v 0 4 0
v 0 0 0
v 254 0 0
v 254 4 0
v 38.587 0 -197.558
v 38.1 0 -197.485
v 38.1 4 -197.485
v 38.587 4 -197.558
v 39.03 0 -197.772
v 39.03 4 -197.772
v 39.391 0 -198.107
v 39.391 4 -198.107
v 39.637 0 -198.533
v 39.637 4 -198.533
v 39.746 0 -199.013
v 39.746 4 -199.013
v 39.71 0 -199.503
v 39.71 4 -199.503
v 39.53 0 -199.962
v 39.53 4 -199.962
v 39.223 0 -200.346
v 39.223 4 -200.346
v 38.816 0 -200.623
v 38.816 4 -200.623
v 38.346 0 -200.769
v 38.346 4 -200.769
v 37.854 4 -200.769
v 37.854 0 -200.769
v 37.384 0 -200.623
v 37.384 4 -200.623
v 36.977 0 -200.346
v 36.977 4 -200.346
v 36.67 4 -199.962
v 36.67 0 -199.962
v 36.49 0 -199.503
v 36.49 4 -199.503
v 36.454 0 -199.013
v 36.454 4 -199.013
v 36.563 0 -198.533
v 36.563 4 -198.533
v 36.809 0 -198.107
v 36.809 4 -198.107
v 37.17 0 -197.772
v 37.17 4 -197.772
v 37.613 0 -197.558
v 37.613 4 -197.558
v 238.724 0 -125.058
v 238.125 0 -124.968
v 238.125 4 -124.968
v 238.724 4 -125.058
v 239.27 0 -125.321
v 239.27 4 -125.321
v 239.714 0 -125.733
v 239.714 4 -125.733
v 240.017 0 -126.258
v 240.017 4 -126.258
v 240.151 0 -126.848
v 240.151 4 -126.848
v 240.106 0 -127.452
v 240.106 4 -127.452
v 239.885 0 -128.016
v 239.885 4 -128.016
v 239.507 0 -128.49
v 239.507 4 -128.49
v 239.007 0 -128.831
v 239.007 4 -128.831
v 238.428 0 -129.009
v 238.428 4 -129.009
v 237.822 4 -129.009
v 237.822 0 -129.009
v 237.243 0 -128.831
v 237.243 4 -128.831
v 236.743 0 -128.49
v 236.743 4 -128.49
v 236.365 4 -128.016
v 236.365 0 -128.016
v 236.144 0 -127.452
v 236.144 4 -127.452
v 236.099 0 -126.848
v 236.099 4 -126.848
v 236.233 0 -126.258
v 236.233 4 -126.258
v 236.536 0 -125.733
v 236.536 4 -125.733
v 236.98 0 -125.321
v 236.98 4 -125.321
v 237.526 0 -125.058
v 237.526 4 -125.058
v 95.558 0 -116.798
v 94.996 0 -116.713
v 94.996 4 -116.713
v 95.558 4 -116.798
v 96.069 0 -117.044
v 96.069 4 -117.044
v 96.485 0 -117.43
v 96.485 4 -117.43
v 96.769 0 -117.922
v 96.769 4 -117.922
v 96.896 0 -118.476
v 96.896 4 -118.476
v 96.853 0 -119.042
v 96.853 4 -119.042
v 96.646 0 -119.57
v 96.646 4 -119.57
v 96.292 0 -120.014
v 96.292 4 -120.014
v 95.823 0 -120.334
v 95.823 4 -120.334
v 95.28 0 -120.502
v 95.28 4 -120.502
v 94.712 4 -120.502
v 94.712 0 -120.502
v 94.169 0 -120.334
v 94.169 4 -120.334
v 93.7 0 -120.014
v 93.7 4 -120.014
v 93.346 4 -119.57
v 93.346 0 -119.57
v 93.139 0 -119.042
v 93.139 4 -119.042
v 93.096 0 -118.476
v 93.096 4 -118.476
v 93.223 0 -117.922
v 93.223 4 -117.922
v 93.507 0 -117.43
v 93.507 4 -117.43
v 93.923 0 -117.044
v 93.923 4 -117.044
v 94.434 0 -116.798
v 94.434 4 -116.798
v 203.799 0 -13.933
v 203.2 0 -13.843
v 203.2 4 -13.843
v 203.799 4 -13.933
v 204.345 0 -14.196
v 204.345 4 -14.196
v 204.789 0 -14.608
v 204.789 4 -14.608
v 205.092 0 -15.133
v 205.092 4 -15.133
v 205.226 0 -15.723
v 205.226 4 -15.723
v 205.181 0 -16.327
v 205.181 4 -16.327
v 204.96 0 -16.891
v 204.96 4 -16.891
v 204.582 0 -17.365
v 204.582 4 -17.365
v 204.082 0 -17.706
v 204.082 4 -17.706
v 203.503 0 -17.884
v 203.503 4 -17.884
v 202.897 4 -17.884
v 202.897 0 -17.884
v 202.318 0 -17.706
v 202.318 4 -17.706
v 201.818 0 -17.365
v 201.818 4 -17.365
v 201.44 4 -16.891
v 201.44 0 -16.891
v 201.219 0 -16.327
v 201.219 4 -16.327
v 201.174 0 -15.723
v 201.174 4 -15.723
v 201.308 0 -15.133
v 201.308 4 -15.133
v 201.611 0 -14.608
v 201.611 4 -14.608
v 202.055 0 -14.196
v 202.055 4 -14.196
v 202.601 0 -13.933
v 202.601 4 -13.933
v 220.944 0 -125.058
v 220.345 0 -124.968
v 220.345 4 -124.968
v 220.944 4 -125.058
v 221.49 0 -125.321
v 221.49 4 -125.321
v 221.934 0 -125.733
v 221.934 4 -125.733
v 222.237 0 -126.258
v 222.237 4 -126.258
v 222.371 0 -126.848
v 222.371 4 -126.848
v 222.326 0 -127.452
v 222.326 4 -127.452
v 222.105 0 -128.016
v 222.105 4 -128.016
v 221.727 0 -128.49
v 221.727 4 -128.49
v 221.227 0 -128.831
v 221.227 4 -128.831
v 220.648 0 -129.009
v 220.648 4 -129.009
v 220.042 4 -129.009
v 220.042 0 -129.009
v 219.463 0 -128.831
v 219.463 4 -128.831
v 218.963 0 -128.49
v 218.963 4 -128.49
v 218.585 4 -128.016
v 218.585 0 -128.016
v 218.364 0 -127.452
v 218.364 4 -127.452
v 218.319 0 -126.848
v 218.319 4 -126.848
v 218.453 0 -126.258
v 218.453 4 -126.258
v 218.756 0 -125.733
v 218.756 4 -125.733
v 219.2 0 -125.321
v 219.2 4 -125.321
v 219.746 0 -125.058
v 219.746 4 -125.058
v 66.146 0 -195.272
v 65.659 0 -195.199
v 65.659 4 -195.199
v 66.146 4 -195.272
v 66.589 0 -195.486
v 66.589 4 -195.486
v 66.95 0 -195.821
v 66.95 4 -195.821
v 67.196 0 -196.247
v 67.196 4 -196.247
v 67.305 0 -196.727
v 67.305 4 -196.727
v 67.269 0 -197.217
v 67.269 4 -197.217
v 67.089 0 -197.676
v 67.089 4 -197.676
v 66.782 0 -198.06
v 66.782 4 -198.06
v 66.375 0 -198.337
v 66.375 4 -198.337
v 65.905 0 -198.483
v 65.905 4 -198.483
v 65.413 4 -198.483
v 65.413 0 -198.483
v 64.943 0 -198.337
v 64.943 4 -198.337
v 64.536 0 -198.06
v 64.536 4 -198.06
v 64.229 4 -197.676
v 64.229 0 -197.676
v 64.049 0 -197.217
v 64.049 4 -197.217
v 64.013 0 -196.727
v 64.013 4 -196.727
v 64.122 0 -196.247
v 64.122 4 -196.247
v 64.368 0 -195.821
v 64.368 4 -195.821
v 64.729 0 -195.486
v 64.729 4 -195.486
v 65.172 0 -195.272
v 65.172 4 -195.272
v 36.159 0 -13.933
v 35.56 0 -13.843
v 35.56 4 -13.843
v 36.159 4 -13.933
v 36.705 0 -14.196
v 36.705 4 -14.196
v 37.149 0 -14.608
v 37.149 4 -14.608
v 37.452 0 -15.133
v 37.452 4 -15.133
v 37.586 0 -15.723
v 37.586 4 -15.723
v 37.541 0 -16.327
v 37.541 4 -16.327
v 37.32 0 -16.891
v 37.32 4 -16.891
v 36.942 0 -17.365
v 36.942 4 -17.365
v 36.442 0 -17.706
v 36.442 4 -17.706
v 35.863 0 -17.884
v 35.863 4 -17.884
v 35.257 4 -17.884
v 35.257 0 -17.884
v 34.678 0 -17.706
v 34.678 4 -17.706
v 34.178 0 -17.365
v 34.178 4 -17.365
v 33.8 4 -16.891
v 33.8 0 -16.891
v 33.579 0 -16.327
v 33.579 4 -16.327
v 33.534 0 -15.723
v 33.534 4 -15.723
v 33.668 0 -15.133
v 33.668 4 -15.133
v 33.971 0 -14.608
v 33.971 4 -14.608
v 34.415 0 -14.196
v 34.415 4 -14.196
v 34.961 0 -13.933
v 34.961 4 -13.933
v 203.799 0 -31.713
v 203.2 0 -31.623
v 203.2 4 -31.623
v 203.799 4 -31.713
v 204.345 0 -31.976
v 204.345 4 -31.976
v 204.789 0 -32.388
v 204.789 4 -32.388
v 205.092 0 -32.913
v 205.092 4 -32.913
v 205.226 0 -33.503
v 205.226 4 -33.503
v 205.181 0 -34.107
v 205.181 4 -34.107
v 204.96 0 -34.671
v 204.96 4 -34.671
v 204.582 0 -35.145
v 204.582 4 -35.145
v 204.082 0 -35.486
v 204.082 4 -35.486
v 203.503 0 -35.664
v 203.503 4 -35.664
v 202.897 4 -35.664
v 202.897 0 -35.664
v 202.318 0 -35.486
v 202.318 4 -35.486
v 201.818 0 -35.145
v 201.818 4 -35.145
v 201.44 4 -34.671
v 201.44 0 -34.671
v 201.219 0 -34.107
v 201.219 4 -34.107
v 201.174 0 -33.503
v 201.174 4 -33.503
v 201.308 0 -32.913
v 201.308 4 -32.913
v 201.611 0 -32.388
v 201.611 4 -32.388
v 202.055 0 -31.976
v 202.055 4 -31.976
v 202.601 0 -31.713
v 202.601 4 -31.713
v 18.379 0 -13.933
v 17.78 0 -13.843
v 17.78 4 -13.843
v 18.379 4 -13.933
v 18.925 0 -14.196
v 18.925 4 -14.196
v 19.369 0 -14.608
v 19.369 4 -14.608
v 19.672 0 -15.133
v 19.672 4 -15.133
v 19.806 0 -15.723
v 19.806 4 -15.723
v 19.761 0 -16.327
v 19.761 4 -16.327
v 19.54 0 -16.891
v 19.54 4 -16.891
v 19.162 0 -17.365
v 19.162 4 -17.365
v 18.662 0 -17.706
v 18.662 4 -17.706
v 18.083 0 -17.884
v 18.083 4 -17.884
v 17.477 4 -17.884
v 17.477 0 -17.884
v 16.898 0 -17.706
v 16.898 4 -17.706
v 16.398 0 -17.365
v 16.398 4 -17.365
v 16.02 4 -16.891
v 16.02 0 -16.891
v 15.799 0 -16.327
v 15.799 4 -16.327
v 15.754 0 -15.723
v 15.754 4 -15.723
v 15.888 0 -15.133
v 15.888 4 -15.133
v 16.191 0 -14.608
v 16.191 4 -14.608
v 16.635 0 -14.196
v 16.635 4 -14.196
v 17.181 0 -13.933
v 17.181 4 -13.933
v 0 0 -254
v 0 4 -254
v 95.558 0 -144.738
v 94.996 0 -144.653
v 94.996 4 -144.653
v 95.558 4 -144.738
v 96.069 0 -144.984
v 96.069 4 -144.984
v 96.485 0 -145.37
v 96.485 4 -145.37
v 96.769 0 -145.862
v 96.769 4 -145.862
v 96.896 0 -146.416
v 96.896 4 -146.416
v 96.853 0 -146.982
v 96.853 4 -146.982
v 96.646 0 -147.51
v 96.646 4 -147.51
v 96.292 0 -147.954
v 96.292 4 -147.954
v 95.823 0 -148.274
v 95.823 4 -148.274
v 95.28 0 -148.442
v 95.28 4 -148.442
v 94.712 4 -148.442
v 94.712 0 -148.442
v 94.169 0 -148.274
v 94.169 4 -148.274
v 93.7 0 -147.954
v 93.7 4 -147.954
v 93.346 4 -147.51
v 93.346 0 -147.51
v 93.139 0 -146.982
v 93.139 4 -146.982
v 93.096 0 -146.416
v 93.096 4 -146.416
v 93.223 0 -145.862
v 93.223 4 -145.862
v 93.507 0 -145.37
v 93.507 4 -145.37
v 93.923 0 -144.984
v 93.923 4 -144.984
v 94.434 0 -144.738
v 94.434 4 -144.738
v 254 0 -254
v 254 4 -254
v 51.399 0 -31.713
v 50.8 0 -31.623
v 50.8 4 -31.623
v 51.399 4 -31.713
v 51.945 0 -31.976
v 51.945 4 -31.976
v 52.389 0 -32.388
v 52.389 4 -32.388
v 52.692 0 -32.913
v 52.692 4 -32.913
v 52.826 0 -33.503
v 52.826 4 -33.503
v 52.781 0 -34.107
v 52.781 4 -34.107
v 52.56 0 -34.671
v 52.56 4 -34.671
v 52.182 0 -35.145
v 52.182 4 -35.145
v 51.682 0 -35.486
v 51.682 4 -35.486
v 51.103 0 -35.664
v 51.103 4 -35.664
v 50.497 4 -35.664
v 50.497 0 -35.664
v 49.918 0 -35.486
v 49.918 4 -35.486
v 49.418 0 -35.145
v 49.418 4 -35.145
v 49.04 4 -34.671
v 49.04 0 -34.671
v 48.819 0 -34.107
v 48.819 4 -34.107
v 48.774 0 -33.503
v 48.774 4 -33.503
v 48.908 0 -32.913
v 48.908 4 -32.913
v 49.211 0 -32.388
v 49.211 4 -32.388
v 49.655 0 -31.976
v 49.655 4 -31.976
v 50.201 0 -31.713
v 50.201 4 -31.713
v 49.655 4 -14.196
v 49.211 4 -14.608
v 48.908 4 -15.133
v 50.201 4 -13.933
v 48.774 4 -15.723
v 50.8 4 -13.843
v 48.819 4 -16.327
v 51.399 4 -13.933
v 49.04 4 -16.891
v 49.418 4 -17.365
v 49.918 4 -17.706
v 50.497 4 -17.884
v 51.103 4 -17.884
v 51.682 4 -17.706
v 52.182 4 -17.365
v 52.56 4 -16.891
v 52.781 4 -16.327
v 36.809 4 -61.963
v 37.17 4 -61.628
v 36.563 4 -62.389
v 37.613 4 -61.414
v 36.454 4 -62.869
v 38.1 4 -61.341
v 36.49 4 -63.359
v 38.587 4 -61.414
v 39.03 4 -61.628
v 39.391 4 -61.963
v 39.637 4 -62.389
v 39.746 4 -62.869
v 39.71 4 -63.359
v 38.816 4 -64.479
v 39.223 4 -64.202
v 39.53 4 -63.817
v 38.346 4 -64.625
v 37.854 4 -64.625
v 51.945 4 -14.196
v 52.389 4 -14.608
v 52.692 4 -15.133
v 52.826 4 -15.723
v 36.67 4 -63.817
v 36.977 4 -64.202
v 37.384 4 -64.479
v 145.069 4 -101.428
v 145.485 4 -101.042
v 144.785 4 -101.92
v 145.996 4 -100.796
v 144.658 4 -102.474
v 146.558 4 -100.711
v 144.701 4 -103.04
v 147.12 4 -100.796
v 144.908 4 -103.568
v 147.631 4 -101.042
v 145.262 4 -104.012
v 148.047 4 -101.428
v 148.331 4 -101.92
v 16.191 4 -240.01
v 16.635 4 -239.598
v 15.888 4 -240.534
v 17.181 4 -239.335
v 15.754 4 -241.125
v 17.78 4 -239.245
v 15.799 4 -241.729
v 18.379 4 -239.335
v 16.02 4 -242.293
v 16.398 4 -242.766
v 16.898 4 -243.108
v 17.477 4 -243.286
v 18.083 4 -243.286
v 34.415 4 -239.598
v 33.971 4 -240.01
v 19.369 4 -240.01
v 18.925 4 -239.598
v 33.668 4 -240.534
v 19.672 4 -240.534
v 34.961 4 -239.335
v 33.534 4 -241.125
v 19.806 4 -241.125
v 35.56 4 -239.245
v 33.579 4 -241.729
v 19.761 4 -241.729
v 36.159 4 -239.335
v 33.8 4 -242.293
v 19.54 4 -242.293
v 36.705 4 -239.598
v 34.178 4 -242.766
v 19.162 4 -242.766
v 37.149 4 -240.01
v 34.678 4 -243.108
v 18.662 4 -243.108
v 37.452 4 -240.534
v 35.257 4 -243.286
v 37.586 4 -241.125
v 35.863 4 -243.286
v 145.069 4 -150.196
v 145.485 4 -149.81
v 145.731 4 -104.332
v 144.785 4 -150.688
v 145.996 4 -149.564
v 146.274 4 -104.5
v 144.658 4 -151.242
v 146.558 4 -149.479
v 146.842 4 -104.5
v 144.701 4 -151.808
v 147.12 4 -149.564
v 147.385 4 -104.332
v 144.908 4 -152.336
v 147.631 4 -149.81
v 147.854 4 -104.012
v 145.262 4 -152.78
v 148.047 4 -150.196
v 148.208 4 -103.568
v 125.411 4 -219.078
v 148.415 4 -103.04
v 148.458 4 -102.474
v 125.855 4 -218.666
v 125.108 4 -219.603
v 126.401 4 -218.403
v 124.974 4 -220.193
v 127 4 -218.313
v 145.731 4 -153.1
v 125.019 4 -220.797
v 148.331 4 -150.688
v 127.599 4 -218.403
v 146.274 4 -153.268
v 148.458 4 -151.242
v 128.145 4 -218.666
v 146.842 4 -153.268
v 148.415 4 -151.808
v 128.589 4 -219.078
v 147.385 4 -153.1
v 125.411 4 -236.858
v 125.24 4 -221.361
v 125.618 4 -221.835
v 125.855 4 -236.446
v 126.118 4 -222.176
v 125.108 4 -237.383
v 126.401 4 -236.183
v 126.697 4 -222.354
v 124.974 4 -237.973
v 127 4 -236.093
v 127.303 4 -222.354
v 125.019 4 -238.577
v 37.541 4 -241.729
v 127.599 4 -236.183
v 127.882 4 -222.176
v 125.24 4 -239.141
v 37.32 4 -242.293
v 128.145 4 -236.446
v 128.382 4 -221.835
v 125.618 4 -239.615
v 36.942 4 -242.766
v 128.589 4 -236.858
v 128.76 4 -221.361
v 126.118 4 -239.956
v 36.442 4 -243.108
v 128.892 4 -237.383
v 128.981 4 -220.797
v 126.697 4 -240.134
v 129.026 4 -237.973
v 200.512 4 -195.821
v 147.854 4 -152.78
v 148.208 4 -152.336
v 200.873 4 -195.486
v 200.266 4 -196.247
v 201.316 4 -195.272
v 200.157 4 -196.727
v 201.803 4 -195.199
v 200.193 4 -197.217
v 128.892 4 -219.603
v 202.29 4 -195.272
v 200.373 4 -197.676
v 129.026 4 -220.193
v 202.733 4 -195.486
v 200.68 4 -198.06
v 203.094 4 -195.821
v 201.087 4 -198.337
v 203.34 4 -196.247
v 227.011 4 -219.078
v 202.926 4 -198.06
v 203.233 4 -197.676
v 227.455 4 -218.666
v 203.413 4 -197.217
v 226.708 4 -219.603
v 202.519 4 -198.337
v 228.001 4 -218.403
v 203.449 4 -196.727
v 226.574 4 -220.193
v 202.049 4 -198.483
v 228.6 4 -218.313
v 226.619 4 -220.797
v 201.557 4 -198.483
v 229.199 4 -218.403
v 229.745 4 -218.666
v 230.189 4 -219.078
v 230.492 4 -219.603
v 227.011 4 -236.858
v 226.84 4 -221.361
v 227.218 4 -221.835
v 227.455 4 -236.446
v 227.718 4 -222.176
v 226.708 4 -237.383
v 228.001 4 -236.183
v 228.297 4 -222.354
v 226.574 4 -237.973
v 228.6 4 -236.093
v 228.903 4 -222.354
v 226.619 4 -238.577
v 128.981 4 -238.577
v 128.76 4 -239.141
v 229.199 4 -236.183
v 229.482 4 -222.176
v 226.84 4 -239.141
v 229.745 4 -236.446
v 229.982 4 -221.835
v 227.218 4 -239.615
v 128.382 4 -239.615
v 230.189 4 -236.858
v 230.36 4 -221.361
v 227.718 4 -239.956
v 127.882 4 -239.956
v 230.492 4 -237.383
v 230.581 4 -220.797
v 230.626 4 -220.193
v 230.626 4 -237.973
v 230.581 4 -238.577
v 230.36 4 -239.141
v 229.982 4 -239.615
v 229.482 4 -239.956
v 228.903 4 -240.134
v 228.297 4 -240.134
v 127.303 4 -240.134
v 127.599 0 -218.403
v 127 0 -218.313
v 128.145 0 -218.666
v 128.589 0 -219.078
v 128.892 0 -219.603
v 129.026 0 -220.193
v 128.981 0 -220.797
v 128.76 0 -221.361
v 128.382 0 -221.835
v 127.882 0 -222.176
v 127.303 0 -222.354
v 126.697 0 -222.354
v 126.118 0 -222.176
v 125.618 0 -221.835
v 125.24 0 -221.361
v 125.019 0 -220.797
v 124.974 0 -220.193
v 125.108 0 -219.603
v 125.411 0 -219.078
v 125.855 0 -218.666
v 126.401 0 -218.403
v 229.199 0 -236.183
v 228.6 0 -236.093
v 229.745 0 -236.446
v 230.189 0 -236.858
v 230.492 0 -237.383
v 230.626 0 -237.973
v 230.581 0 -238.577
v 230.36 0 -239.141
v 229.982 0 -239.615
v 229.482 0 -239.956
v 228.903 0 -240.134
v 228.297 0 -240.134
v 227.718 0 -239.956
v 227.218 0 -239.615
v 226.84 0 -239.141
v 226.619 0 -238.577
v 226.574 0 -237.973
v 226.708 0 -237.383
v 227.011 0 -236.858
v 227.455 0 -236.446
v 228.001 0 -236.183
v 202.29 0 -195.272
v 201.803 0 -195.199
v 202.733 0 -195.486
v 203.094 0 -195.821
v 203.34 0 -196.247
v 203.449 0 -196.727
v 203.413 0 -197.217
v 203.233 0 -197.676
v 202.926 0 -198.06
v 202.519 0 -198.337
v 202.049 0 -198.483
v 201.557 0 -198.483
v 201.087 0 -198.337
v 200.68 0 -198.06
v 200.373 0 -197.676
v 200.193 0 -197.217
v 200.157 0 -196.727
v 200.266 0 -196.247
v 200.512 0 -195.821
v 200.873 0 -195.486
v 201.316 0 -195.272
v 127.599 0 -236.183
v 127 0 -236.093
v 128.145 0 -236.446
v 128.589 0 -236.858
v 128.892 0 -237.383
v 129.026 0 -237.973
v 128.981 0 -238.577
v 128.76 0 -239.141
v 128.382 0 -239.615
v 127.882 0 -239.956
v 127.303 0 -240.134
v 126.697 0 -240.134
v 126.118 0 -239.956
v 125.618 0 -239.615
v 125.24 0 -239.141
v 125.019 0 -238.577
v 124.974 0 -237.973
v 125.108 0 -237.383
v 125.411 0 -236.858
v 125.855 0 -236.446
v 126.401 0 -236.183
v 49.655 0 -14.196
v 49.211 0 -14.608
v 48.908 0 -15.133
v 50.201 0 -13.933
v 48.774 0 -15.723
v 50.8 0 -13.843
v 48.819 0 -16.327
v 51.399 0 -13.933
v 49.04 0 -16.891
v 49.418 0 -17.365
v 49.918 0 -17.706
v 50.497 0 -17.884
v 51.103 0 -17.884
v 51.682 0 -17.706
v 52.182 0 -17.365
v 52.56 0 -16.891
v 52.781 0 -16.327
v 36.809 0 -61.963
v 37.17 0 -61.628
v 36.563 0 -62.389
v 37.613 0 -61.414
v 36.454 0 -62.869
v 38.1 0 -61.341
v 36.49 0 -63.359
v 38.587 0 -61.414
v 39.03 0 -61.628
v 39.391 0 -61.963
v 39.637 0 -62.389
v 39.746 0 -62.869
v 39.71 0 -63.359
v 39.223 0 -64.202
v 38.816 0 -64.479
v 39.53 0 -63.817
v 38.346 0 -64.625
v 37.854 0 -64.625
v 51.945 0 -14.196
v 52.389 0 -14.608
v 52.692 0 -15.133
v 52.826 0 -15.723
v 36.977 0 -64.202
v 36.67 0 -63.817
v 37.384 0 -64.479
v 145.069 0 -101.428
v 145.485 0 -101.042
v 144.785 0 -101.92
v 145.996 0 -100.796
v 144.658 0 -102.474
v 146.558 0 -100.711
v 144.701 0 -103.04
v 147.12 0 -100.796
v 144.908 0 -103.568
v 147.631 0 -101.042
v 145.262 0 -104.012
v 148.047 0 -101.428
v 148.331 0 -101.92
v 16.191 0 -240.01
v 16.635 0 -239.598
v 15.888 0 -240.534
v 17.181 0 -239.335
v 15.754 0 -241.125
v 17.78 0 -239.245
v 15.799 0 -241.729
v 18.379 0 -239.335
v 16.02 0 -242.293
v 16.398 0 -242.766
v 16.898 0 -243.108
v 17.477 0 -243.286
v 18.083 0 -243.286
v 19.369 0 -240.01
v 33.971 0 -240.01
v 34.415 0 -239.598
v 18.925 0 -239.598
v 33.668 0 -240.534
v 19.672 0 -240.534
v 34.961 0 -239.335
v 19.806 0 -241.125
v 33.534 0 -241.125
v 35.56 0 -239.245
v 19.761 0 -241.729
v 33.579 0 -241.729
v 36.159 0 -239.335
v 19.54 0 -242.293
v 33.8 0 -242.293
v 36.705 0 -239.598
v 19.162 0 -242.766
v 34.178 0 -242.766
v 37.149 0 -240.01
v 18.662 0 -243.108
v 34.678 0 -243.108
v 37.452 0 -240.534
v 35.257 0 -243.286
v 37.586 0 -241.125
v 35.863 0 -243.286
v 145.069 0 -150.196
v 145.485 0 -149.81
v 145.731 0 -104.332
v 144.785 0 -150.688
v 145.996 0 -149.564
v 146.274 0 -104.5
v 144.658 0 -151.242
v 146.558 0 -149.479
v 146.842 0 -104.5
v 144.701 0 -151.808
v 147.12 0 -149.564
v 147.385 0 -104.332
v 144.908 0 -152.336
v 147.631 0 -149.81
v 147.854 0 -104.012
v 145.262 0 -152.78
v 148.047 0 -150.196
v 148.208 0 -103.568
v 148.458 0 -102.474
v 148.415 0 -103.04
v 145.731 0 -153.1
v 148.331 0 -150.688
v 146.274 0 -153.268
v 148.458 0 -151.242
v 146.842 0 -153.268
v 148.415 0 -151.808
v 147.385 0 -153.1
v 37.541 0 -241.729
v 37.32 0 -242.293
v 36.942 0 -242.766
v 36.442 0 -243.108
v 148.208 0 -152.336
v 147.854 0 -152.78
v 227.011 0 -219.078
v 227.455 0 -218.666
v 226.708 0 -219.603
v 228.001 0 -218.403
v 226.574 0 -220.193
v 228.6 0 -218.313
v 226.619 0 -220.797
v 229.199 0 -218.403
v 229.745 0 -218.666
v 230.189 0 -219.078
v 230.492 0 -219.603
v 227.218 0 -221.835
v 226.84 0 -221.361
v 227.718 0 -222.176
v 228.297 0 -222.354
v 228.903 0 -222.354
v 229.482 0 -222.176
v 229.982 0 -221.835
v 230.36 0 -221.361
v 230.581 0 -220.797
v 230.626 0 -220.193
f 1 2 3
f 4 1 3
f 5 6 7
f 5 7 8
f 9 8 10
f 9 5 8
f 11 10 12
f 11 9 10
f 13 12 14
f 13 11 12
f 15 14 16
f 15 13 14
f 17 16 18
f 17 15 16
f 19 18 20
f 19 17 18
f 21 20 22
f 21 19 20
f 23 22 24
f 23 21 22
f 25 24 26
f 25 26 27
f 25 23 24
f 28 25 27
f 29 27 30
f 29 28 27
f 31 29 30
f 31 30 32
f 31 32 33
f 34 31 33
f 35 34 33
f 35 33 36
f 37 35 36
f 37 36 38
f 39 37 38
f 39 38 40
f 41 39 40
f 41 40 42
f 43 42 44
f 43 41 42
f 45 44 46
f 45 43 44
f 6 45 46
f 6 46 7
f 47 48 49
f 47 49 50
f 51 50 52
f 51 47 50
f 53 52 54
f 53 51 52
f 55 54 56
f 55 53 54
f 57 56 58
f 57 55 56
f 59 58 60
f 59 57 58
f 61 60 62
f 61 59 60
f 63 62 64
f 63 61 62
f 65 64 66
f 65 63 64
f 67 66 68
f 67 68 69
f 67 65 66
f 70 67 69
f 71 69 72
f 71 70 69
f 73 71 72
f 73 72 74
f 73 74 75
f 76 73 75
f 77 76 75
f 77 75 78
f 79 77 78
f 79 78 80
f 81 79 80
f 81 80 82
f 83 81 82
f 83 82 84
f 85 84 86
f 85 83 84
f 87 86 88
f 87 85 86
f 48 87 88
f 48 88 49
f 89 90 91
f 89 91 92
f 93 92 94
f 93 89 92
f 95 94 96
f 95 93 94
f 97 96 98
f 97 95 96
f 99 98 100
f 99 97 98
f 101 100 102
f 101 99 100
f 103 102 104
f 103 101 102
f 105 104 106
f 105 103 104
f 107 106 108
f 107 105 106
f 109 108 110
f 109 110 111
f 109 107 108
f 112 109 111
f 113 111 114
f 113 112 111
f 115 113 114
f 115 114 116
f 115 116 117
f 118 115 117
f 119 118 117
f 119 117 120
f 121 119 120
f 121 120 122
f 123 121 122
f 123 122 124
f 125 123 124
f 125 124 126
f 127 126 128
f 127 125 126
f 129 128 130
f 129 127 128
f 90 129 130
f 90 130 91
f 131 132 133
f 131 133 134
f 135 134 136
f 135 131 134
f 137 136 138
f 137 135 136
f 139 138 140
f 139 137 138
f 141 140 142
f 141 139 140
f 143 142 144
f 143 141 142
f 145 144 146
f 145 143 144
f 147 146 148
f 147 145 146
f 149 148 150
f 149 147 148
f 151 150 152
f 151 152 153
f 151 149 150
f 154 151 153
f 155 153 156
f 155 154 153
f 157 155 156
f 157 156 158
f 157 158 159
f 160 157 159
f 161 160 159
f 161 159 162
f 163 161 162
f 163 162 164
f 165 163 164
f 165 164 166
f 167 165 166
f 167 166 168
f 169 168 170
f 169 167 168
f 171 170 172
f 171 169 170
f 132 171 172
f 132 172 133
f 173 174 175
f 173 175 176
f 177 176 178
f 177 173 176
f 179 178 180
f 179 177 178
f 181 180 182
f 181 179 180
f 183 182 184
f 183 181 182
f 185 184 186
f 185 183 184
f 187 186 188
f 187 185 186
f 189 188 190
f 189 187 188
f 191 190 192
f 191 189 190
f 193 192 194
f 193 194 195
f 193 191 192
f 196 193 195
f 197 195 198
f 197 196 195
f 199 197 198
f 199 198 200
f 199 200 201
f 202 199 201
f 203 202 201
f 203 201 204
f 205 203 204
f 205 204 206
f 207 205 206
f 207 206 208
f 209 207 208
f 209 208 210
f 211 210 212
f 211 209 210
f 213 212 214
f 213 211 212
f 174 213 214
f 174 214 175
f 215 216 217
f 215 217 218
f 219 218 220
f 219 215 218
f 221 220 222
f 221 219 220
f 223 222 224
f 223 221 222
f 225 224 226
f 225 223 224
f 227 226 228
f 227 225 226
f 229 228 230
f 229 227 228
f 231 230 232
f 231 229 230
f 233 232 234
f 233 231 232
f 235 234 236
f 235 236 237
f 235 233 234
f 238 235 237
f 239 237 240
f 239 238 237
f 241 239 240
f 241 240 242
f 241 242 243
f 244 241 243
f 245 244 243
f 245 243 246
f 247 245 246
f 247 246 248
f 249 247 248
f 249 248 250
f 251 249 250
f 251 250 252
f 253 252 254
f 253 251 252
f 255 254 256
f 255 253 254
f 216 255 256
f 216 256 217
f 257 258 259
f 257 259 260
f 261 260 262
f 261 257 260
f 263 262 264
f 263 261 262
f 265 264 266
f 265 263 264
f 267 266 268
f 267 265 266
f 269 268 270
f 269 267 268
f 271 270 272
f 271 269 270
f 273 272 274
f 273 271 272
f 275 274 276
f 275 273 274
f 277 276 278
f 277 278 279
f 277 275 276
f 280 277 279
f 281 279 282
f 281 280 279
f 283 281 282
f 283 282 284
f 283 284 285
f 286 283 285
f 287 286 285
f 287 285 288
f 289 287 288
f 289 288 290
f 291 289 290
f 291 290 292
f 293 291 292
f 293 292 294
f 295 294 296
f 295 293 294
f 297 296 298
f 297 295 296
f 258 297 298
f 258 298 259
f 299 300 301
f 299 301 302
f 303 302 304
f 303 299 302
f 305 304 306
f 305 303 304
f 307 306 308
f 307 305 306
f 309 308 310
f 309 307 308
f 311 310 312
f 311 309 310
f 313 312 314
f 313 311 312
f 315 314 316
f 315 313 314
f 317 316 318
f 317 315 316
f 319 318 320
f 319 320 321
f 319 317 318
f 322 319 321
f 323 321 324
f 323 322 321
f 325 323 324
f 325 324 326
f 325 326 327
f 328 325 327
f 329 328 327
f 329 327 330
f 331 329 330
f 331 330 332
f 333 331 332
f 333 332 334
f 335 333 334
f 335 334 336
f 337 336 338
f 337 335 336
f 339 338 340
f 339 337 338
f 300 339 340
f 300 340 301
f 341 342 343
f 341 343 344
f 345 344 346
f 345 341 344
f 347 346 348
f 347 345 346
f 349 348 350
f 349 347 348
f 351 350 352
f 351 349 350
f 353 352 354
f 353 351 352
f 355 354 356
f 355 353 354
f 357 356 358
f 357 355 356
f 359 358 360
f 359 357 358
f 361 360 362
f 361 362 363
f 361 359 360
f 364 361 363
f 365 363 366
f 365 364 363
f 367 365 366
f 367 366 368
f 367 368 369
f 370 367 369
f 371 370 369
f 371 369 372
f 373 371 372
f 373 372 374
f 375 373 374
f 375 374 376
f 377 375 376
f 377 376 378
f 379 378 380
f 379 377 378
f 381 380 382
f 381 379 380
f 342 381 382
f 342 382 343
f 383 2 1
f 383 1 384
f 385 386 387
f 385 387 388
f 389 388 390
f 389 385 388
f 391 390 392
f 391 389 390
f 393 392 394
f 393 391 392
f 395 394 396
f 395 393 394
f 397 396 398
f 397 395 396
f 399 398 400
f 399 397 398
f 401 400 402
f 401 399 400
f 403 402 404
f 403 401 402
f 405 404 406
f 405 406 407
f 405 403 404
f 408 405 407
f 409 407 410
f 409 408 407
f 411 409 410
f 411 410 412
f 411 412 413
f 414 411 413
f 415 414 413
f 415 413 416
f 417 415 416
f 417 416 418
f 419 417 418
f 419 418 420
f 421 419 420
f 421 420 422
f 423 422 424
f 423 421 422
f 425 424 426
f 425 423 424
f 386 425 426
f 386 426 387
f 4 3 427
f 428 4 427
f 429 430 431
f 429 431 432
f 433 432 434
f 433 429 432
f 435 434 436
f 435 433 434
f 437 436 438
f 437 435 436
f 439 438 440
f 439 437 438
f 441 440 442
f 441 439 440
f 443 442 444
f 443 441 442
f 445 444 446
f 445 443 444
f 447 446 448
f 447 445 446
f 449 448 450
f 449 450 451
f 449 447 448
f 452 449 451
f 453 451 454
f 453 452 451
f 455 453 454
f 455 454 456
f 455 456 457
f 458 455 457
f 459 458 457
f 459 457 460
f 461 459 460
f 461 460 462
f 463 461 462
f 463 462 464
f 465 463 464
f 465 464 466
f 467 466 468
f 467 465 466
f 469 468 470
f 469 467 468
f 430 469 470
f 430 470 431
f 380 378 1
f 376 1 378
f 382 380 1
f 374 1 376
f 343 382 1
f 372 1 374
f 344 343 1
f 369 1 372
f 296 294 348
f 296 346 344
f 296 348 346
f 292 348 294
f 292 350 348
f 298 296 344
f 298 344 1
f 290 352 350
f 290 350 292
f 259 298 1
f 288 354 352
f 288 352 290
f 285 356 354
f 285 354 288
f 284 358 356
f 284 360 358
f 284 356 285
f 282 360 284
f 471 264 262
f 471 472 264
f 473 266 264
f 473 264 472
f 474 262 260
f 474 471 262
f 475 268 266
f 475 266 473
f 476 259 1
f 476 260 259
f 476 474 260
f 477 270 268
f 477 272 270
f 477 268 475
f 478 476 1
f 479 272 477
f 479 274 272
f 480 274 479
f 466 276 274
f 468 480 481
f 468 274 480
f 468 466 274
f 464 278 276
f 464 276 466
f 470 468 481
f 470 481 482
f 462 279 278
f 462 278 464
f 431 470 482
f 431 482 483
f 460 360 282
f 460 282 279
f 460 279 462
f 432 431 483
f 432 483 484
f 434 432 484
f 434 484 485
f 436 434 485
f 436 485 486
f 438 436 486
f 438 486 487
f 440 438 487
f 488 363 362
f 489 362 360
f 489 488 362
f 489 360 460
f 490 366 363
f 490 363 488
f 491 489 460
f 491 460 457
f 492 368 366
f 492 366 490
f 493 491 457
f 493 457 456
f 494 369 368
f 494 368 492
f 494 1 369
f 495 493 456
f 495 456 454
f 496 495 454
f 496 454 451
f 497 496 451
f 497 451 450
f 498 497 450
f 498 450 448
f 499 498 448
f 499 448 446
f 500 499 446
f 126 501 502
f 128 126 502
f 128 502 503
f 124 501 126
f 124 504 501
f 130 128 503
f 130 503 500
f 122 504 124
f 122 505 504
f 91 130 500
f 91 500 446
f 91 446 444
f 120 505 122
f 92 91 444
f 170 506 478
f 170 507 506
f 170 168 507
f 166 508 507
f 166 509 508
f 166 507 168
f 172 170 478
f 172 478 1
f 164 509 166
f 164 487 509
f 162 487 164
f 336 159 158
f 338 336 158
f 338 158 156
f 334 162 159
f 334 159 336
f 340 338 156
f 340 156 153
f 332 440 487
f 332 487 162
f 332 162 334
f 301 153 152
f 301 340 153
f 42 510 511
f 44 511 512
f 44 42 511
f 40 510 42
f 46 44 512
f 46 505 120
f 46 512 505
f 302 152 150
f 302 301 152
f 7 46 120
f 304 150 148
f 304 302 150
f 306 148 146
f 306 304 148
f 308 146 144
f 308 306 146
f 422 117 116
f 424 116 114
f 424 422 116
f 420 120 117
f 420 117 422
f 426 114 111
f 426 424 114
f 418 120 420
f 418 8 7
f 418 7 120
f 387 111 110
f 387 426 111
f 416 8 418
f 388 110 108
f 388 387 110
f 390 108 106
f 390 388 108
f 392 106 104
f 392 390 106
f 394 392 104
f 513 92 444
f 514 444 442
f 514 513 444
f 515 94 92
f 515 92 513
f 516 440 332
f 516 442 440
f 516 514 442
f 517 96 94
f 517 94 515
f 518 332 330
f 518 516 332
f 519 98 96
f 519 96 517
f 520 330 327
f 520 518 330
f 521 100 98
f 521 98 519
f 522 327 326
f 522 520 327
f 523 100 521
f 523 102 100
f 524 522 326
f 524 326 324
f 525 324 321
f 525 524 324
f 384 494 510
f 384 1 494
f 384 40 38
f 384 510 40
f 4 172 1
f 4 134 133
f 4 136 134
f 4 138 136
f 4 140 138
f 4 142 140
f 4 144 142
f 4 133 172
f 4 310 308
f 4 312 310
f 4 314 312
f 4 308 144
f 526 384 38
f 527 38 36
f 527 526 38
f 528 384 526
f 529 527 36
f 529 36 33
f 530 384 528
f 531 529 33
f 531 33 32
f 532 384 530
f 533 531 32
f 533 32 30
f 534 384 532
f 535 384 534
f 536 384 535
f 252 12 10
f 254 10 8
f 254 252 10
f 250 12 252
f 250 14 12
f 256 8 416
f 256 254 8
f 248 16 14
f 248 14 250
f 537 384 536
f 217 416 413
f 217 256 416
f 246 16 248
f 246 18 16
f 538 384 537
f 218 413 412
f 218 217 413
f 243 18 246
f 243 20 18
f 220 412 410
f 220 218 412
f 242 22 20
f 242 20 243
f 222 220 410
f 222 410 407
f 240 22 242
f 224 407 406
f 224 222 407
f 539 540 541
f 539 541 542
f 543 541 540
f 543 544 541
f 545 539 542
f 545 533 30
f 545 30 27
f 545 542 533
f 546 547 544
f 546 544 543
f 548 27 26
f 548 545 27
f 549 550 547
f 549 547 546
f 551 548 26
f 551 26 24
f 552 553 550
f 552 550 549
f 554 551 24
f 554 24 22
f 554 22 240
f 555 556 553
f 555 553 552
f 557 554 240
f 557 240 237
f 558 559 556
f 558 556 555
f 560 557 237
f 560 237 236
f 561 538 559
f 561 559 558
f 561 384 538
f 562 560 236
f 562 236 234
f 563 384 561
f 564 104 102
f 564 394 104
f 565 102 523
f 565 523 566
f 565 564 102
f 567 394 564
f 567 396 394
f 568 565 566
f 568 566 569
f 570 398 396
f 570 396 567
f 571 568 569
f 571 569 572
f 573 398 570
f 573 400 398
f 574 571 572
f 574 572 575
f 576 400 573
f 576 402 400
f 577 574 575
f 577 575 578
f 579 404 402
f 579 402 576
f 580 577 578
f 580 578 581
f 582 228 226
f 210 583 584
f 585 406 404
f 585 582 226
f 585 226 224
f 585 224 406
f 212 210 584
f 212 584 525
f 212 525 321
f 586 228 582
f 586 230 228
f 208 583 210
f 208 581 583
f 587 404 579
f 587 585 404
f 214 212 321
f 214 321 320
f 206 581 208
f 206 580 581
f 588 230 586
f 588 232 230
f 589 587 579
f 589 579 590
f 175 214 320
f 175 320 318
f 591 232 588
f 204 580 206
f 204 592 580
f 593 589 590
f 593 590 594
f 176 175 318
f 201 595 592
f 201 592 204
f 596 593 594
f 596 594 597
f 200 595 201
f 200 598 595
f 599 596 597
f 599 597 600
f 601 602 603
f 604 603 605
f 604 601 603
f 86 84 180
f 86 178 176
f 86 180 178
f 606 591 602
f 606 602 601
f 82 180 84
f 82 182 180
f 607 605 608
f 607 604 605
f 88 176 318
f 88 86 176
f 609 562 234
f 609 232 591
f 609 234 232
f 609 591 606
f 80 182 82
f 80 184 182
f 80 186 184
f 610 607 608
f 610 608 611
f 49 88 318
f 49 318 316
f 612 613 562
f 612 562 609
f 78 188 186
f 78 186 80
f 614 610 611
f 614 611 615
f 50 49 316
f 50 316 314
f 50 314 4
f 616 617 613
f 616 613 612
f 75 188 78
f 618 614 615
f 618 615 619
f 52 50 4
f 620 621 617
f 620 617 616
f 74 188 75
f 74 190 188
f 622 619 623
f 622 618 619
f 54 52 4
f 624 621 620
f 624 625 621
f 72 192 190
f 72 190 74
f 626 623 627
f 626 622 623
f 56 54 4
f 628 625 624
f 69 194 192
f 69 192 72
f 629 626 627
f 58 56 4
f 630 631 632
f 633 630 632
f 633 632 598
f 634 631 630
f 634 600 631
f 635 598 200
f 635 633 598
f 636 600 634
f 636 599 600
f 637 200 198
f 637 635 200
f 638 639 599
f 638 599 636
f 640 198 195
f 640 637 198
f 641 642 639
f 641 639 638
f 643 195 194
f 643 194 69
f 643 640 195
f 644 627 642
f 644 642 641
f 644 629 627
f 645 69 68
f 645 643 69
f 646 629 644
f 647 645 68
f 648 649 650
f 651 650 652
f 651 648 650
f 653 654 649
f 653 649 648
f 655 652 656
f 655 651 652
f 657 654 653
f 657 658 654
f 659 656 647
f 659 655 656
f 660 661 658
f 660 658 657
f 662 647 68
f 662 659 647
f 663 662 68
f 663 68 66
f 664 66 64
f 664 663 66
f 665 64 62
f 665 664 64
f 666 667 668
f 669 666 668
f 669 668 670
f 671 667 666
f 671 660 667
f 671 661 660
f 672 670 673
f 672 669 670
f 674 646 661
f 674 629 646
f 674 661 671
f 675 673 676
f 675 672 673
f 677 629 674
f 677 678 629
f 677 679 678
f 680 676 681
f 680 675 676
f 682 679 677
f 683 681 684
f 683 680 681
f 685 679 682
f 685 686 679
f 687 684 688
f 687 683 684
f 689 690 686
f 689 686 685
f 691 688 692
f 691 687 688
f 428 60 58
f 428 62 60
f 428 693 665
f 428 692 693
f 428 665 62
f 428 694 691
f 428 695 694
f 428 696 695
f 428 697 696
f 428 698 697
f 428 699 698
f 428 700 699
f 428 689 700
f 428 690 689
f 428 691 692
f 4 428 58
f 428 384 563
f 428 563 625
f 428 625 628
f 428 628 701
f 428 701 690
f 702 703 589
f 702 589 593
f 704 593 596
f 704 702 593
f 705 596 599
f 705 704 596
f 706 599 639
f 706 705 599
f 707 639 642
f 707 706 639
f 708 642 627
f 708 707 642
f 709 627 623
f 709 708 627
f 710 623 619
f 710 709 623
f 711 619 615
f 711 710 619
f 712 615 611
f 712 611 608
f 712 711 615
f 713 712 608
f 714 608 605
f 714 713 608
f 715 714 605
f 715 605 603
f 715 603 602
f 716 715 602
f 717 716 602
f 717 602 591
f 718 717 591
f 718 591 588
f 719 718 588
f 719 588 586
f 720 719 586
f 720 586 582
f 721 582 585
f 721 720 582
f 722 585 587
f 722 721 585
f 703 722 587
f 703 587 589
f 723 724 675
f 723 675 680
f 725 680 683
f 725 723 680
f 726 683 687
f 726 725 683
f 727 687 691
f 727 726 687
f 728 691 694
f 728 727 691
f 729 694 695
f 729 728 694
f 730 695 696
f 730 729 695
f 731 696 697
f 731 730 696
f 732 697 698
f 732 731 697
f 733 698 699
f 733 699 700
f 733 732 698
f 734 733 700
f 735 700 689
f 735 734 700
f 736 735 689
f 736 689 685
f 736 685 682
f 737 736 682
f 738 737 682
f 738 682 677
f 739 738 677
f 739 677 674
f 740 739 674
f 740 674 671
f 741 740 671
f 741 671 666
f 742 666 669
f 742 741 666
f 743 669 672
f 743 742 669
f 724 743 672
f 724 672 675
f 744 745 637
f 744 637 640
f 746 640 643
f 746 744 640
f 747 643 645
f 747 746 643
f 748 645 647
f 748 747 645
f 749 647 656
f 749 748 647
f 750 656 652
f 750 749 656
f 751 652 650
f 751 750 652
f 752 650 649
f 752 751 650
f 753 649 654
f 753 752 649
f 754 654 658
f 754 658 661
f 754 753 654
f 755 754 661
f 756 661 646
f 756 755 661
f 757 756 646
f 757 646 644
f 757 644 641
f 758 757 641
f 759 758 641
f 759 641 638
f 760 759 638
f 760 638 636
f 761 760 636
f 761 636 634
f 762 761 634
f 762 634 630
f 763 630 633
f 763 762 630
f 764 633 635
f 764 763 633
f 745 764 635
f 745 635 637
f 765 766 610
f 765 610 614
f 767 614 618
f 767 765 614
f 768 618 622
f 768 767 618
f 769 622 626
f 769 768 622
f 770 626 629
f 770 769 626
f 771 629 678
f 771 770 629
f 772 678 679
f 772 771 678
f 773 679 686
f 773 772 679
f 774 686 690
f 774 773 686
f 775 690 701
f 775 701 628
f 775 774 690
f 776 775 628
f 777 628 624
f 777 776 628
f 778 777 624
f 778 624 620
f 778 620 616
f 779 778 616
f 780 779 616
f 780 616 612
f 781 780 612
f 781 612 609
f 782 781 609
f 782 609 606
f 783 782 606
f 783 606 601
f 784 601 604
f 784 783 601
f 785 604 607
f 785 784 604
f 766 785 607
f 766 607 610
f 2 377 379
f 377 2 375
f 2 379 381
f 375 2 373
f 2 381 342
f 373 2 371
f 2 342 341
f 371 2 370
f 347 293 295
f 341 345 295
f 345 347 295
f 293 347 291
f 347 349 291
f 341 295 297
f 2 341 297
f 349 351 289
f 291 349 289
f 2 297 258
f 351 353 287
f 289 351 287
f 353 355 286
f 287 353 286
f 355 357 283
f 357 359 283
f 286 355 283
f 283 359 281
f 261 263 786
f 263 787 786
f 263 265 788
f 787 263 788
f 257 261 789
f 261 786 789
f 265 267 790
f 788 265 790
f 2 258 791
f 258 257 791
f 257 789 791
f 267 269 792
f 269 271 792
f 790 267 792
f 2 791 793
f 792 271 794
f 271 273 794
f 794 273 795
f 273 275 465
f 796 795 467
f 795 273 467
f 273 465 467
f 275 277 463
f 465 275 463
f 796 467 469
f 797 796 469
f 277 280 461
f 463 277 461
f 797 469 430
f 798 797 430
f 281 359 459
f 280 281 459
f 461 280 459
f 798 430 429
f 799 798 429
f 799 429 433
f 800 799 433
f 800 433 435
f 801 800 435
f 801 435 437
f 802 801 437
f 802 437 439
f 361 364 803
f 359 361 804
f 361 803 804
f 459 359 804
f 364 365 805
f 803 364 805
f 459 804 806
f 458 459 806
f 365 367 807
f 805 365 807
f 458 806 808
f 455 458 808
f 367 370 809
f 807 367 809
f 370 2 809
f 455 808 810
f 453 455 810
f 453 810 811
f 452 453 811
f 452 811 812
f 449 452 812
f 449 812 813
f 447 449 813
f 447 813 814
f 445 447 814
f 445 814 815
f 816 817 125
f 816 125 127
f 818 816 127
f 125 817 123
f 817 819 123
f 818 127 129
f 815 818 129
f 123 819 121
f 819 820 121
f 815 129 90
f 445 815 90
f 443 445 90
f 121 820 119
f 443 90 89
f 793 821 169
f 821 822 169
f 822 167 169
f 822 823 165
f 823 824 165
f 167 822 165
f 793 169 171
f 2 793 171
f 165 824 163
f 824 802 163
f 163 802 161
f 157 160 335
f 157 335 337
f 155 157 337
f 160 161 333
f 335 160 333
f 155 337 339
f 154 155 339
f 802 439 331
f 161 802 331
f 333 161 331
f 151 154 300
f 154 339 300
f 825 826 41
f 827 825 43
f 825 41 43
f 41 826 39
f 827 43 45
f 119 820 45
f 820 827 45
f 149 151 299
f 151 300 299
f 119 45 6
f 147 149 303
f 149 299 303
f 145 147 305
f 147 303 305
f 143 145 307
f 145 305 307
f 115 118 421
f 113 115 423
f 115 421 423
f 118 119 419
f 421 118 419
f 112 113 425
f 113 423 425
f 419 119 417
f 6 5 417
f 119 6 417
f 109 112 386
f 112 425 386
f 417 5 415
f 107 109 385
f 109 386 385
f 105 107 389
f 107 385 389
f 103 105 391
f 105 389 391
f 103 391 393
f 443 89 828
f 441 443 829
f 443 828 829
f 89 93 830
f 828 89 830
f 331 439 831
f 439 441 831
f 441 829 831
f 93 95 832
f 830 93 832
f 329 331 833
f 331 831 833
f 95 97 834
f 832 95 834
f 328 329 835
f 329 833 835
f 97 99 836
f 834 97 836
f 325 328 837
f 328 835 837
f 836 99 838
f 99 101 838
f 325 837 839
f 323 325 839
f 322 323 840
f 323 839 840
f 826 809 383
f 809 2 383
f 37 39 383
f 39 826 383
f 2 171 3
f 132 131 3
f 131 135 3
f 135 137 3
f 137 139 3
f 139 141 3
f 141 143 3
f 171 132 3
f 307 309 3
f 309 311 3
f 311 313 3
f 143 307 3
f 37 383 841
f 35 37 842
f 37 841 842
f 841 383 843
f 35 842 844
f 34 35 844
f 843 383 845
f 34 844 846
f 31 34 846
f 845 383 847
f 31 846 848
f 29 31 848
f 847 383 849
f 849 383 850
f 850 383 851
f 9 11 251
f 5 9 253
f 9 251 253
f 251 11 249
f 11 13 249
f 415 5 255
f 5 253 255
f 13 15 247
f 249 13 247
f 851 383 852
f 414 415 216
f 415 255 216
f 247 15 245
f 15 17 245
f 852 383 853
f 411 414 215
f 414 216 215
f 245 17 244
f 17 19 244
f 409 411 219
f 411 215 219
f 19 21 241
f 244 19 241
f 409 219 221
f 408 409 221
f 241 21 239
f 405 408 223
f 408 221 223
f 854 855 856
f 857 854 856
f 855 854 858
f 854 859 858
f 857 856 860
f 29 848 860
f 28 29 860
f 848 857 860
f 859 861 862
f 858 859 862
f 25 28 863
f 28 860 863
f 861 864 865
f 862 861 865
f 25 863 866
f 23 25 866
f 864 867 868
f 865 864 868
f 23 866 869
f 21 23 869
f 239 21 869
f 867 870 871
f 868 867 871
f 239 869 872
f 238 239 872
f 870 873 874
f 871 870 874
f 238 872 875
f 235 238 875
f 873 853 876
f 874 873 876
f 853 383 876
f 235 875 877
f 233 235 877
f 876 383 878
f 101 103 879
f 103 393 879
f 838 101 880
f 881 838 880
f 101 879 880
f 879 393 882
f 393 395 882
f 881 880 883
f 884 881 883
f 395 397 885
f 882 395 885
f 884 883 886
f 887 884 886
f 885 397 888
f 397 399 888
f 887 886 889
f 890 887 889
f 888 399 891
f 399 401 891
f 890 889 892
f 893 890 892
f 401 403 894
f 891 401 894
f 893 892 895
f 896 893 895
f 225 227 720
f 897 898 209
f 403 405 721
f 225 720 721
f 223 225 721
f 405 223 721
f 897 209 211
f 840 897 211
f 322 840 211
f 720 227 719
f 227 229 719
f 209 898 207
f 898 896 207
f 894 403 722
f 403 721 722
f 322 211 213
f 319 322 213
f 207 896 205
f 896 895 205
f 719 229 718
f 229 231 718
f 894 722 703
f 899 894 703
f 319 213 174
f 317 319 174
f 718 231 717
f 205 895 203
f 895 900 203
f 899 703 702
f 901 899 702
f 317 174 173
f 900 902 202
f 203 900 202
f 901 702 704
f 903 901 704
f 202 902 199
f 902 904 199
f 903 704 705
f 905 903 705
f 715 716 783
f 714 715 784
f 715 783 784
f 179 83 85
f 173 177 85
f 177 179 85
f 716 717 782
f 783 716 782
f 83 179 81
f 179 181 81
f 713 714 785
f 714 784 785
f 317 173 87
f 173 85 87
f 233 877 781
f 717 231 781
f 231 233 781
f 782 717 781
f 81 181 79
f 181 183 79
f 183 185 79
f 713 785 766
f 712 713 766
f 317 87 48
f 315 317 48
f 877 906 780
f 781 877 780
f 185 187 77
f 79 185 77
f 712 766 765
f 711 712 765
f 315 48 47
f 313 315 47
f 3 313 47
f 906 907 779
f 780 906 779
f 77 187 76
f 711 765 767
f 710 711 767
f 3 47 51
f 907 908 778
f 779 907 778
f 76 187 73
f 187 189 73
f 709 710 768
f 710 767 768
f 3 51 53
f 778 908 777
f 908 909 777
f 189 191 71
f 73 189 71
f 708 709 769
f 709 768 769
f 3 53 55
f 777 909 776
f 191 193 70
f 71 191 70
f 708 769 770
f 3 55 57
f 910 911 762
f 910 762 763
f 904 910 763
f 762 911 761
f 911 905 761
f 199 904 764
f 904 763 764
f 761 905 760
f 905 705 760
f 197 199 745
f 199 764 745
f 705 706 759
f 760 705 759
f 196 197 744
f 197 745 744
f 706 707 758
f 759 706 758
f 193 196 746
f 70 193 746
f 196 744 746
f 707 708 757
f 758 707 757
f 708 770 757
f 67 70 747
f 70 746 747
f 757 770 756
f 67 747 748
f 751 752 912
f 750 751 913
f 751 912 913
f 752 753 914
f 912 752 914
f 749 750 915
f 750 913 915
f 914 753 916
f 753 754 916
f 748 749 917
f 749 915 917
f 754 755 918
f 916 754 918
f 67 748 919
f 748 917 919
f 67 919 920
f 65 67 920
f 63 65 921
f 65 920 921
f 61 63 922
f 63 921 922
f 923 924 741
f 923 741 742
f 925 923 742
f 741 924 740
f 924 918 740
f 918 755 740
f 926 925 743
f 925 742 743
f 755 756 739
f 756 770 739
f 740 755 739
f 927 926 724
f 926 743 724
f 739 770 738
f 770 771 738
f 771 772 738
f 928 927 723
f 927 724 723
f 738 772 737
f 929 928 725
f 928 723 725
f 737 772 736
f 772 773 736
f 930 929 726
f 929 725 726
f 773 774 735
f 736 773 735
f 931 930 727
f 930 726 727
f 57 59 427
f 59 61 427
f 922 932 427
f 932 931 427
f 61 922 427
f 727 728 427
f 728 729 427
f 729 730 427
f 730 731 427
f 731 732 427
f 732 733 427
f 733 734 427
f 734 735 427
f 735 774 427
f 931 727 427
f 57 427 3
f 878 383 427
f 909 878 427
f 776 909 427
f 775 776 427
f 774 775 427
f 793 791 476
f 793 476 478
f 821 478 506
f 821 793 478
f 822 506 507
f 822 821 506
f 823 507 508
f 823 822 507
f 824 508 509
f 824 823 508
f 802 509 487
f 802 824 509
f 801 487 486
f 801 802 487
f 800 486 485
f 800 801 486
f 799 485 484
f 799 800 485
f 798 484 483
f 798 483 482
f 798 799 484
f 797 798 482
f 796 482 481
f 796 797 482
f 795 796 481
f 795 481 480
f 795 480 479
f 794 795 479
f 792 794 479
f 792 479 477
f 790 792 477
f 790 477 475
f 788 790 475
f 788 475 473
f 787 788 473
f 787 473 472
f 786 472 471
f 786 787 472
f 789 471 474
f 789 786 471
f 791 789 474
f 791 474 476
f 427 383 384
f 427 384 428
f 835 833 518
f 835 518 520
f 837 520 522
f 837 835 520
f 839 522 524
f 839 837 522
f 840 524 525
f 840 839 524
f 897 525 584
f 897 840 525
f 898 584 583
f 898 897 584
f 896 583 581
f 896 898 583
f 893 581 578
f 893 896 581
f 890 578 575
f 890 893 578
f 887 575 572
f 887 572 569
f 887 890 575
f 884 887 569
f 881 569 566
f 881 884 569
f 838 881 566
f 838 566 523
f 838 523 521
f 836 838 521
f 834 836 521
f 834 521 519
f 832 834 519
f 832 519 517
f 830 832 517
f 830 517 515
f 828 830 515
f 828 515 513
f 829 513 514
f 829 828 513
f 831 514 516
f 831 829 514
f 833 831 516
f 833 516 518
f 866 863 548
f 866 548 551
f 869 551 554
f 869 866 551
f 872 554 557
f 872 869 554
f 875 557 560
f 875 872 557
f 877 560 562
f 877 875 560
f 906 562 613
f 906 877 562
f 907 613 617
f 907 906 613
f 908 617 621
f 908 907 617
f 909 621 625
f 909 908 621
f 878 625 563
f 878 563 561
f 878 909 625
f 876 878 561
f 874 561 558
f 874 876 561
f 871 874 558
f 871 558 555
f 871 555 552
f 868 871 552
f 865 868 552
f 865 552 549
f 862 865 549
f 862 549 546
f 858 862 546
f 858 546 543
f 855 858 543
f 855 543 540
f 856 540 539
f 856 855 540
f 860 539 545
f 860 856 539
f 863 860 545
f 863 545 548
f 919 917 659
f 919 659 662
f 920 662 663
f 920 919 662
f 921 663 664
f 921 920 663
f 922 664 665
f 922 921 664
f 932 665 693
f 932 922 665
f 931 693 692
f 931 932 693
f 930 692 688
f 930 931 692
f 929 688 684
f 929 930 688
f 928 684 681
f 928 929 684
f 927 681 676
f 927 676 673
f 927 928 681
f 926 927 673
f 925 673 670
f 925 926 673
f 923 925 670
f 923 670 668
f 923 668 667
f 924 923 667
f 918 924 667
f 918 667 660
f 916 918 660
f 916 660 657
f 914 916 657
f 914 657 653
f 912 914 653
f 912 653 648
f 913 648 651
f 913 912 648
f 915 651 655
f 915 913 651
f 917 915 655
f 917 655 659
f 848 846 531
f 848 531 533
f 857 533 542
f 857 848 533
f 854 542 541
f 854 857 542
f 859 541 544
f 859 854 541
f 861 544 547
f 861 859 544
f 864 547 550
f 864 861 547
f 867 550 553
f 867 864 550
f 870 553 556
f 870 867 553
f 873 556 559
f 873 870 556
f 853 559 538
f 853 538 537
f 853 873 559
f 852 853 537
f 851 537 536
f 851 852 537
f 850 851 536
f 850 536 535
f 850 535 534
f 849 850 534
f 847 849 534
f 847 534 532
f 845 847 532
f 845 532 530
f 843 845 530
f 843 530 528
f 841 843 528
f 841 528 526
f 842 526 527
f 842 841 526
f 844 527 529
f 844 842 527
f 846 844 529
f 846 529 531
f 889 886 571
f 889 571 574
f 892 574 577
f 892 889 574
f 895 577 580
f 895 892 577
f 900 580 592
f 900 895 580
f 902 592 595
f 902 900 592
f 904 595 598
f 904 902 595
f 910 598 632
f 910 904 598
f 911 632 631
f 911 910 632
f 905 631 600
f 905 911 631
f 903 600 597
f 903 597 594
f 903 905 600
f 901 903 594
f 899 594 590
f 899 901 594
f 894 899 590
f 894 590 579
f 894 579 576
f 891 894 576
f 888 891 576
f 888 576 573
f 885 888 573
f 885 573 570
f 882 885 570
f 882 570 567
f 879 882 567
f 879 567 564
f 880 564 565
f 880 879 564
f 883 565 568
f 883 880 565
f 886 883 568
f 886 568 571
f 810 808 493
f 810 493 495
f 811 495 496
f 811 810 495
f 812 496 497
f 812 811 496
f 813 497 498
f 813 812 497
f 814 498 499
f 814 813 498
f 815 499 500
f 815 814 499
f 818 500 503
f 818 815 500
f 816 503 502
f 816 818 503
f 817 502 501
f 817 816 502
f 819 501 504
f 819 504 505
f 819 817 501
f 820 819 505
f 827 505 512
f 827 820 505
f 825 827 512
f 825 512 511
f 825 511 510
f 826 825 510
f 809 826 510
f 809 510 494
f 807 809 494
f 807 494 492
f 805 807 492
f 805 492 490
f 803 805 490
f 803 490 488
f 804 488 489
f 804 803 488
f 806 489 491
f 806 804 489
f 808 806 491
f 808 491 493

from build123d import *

# Parameters (mm, degrees)
SKETCH1_W           = 254
SKETCH1_H           = 254
SKETCH1_R           = 1.651
SKETCH1_R_2         = 2.032
SKETCH1_R_3         = 1.905
BOSS_EXTRUDE1_DEPTH = 4


with BuildPart() as part:
    # Sketch1 → Boss-Extrude1 (new body)
    with BuildSketch(Plane(origin=(0, 0, 0), x_dir=(1, 0, 0), z_dir=(0, 1, 0))):
        with Locations((127, 127)):
            Rectangle(SKETCH1_W, SKETCH1_H)
        with Locations(Location((201.803, 196.85, 0), (0, 0, 270))):
            Circle(SKETCH1_R, mode=Mode.SUBTRACT)
        with Locations(Location((65.659, 196.85, 0), (0, 0, 270))):
            Circle(SKETCH1_R, mode=Mode.SUBTRACT)
        with Locations(Location((38.1, 199.136, 0), (0, 0, 270))):
            Circle(SKETCH1_R, mode=Mode.SUBTRACT)
        with Locations(Location((220.345, 127, 0), (0, 0, 270))):
            Circle(SKETCH1_R_2, mode=Mode.SUBTRACT)
        with Locations(Location((238.125, 127, 0), (0, 0, 270))):
            Circle(SKETCH1_R_2, mode=Mode.SUBTRACT)
        with Locations(Location((50.8, 33.655, 0), (0, 0, 270))):
            Circle(SKETCH1_R_2, mode=Mode.SUBTRACT)
        with Locations(Location((50.8, 15.875, 0), (0, 0, 270))):
            Circle(SKETCH1_R_2, mode=Mode.SUBTRACT)
        with Locations(Location((228.6, 238.125, 0), (0, 0, 270))):
            Circle(SKETCH1_R_2, mode=Mode.SUBTRACT)
        with Locations(Location((228.6, 220.345, 0), (0, 0, 270))):
            Circle(SKETCH1_R_2, mode=Mode.SUBTRACT)
        with Locations(Location((94.996, 146.558, 0), (0, 0, 270))):
            Circle(SKETCH1_R_3, mode=Mode.SUBTRACT)
        with Locations(Location((94.996, 118.618, 0), (0, 0, 270))):
            Circle(SKETCH1_R_3, mode=Mode.SUBTRACT)
        with Locations(Location((146.558, 102.616, 0), (0, 0, 270))):
            Circle(SKETCH1_R_3, mode=Mode.SUBTRACT)
        with Locations(Location((146.558, 151.384, 0), (0, 0, 270))):
            Circle(SKETCH1_R_3, mode=Mode.SUBTRACT)
        with Locations(Location((38.1, 62.992, 0), (0, 0, 270))):
            Circle(SKETCH1_R, mode=Mode.SUBTRACT)
        with Locations(Location((203.2, 33.655, 0), (0, 0, 270))):
            Circle(SKETCH1_R_2, mode=Mode.SUBTRACT)
        with Locations(Location((203.2, 15.875, 0), (0, 0, 270))):
            Circle(SKETCH1_R_2, mode=Mode.SUBTRACT)
        with Locations(Location((127, 238.125, 0), (0, 0, 270))):
            Circle(SKETCH1_R_2, mode=Mode.SUBTRACT)
        with Locations(Location((127, 220.345, 0), (0, 0, 270))):
            Circle(SKETCH1_R_2, mode=Mode.SUBTRACT)
        with Locations(Location((35.56, 15.875, 0), (0, 0, 270))):
            Circle(SKETCH1_R_2, mode=Mode.SUBTRACT)
        with Locations(Location((17.78, 15.875, 0), (0, 0, 270))):
            Circle(SKETCH1_R_2, mode=Mode.SUBTRACT)
        with Locations(Location((17.78, 241.276758032, 0), (0, 0, 270))):
            Circle(SKETCH1_R_2, mode=Mode.SUBTRACT)
        with Locations(Location((35.56, 241.276758032, 0), (0, 0, 270))):
            Circle(SKETCH1_R_2, mode=Mode.SUBTRACT)
    extrude(amount=BOSS_EXTRUDE1_DEPTH)


solid = part.part
